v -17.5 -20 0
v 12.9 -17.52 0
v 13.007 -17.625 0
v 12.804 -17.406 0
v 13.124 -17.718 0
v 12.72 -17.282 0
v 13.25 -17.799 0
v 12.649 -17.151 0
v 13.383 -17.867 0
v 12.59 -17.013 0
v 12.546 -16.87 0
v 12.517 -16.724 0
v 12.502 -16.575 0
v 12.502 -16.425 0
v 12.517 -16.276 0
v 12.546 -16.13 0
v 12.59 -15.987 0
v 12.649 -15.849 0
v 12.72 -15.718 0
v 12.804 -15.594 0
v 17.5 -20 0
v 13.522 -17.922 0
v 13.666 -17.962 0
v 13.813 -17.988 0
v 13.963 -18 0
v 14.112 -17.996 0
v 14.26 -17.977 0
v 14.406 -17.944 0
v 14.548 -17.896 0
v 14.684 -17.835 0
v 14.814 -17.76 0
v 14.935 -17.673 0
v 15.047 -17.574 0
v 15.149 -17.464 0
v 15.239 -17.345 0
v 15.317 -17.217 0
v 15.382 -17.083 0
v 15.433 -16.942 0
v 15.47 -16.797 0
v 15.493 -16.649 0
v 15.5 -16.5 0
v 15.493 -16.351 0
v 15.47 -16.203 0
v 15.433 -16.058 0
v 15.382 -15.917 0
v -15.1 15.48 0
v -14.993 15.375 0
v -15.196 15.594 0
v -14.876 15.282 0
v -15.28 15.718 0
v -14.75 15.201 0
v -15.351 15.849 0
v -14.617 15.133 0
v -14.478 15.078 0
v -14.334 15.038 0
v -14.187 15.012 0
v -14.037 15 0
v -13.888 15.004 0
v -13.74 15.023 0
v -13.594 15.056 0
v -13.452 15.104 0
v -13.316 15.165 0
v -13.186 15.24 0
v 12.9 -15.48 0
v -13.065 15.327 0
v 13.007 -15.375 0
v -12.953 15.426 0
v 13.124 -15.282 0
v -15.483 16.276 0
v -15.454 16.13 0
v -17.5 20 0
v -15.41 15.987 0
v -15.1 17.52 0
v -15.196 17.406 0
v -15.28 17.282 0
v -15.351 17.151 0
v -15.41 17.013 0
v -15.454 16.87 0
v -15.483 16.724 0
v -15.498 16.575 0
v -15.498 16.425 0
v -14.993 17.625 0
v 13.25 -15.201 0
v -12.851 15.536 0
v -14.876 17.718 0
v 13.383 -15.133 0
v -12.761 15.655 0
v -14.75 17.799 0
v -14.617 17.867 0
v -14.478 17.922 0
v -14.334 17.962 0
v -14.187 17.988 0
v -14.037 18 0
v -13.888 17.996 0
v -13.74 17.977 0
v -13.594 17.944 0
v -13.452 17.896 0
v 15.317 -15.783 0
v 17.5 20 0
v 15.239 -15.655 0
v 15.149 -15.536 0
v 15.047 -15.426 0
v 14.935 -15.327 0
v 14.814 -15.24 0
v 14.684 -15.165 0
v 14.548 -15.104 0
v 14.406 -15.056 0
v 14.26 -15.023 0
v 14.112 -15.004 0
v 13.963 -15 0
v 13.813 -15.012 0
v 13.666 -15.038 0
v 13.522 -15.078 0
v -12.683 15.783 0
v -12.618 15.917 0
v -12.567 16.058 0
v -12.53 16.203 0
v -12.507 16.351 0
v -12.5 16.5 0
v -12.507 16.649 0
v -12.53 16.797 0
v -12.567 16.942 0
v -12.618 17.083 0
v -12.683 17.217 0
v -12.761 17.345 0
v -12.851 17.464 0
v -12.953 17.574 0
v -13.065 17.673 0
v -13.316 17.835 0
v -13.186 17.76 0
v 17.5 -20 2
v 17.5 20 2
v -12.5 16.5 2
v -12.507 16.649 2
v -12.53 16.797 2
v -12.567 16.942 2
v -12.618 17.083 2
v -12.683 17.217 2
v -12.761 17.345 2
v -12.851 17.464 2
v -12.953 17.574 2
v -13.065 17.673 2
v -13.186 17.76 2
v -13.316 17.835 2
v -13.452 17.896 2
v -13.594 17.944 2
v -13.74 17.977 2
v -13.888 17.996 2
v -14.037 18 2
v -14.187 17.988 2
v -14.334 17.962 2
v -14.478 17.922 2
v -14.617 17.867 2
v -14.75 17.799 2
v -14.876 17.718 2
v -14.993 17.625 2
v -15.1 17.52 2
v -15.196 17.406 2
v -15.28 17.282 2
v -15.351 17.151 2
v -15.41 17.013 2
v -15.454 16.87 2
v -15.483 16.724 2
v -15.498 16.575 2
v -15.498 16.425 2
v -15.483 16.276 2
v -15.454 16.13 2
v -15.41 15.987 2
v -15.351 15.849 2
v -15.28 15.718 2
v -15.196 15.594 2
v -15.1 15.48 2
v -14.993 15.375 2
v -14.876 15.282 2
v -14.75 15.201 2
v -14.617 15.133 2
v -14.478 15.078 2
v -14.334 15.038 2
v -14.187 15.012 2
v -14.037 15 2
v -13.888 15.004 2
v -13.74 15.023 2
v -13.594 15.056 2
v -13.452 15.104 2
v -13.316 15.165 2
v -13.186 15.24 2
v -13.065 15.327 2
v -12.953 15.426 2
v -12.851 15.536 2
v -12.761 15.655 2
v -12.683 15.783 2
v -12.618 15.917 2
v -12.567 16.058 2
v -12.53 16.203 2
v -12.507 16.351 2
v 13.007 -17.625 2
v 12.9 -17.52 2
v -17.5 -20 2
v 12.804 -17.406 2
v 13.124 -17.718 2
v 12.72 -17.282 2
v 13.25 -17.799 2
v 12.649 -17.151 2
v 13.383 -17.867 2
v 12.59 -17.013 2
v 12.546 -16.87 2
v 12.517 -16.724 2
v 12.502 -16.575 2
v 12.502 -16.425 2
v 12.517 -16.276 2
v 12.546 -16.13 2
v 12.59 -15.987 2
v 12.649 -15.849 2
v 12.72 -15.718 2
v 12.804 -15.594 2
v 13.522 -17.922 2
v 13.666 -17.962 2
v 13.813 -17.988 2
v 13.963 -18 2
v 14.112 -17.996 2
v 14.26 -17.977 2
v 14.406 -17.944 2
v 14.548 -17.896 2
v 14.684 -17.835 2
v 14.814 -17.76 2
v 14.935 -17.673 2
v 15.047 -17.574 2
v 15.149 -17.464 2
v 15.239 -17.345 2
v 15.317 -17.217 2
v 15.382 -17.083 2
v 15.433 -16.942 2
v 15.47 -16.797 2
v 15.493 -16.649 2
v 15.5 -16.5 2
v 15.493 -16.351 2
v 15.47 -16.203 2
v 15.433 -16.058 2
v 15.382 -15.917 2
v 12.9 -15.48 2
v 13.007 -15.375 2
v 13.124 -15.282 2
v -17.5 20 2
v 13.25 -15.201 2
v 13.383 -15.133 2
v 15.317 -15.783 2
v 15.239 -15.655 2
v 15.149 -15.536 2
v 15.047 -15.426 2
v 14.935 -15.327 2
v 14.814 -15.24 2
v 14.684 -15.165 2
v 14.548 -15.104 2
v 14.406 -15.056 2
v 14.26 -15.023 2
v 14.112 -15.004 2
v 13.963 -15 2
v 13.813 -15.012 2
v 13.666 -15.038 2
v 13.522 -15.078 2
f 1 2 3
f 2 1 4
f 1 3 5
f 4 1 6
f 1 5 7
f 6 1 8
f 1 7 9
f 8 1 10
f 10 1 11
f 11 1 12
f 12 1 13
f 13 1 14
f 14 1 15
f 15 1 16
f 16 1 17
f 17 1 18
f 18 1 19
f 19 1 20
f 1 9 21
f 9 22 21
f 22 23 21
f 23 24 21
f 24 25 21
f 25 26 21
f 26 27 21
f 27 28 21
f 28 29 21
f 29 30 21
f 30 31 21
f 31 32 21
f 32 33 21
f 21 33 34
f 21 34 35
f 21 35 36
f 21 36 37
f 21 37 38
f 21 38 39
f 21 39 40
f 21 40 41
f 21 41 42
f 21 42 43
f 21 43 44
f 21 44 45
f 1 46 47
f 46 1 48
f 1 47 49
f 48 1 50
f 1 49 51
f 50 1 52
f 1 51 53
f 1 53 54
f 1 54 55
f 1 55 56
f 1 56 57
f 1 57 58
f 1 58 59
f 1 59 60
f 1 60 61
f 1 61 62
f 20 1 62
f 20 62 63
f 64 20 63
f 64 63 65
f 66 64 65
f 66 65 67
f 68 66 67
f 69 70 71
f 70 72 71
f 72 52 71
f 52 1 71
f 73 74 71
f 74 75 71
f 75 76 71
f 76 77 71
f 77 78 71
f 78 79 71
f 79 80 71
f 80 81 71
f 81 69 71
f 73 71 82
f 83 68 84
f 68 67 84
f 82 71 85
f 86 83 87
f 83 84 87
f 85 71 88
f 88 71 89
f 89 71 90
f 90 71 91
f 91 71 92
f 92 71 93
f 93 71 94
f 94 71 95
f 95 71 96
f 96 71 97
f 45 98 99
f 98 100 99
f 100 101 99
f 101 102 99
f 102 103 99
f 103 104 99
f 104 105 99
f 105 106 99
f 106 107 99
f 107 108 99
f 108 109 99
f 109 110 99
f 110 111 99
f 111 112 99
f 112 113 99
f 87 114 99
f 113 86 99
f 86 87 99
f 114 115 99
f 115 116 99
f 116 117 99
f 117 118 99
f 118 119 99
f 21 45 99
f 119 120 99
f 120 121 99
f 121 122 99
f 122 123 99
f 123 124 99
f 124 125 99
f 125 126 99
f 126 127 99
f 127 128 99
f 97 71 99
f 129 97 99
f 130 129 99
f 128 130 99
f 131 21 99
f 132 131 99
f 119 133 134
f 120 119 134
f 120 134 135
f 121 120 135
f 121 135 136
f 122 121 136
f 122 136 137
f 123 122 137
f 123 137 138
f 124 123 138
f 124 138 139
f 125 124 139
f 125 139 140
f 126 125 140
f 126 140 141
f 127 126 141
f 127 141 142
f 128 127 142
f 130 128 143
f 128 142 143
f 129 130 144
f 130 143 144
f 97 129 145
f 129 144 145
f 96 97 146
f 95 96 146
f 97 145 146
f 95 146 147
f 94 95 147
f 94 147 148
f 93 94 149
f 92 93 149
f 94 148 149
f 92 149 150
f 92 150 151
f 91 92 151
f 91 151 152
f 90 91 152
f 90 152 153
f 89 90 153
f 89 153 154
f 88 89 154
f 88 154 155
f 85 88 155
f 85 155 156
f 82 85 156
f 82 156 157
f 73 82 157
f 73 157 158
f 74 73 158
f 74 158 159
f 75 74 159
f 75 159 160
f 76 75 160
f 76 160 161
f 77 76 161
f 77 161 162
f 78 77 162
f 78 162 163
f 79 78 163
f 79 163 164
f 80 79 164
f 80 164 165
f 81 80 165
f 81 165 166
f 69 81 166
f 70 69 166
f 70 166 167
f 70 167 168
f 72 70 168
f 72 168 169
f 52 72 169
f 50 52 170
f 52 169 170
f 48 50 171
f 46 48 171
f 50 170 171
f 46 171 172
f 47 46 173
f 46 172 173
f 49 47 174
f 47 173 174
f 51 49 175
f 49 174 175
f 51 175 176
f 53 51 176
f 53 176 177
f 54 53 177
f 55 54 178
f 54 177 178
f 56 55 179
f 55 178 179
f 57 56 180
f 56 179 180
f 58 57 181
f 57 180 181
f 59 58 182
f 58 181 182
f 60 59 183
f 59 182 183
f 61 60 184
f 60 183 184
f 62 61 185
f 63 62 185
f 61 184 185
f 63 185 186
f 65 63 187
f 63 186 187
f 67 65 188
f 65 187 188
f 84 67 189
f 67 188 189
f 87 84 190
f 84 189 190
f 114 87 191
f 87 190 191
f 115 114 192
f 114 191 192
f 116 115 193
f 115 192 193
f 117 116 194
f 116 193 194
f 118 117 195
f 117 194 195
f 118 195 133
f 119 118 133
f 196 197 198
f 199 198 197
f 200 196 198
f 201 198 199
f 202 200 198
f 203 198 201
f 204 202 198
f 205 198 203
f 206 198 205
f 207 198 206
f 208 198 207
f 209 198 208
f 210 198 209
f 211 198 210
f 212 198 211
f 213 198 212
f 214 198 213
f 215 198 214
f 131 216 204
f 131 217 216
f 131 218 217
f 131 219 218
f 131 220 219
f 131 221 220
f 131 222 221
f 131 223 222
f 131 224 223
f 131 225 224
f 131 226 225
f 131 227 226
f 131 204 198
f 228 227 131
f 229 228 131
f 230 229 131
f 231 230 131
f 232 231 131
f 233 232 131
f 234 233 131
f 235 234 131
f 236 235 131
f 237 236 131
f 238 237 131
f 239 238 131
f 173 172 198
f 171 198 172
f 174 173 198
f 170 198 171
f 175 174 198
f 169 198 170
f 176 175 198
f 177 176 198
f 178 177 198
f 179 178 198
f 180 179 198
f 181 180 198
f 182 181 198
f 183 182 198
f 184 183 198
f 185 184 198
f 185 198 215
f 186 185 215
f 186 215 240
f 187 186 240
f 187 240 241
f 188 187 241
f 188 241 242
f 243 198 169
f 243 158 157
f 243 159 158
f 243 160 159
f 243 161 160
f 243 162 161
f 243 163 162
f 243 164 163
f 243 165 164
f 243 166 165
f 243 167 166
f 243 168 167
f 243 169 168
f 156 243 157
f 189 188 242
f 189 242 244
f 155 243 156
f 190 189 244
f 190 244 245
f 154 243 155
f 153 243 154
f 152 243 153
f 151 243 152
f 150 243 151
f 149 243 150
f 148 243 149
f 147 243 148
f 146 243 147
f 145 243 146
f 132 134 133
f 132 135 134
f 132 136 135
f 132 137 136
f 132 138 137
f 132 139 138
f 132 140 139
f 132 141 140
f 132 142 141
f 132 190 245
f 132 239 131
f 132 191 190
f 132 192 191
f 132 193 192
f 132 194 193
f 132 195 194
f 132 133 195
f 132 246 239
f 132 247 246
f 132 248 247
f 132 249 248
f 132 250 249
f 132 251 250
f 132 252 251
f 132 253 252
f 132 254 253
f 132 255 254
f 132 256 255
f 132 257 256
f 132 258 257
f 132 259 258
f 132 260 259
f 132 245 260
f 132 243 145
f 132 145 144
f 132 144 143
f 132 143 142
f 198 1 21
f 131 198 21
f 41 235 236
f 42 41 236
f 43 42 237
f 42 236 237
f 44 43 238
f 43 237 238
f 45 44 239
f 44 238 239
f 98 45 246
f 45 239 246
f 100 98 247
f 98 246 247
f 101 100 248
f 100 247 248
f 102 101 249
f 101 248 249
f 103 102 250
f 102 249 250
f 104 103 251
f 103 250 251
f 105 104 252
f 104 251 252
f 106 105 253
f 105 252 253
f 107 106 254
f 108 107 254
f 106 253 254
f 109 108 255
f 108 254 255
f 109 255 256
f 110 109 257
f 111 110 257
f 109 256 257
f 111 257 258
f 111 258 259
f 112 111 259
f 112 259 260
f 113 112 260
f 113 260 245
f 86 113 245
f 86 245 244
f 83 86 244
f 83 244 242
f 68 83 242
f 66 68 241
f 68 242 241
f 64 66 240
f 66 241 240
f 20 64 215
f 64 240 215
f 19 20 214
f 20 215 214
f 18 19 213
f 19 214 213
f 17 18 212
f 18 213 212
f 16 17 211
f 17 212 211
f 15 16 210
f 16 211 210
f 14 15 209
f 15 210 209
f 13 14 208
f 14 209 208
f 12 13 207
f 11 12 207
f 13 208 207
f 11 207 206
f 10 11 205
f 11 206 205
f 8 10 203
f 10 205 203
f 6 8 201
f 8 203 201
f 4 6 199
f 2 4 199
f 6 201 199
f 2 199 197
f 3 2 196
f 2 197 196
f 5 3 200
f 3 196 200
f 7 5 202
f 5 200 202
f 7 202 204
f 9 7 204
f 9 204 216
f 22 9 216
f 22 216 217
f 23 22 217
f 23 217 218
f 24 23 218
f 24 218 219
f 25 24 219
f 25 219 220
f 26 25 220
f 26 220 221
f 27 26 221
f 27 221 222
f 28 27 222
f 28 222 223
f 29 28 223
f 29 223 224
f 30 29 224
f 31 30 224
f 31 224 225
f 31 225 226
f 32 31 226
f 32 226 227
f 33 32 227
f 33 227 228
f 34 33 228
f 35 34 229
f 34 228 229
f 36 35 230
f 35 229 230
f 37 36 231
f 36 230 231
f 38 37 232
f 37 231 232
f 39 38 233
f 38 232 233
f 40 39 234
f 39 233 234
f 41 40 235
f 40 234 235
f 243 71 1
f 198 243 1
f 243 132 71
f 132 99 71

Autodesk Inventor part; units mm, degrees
ref_plane "YZ Plane" through (0, 0, 0) normal (1, 0, 0) x (0, 1, 0)
ref_plane "XZ Plane" through (0, 0, 0) normal (0, 1, 0) x (-1, 0, 0)
ref_plane "XY Plane" through (0, 0, 0) normal (0, 0, 1) x (1, 0, 0)
sketch "Sketch1" plane through (0, 0, 0) normal (0, 0, 1) x (1, 0, 0)
  line L0 (0, 0) -> (17.5, 0)
  line L1 (17.5, 0) -> (17.5, 20)
  line L2 (17.5, 20) -> (0, 20)
  line L3 (0, 20) -> (0, 0)
  line L4 (0, 0) -> (-17.5, 0)
  line L5 (-17.5, 0) -> (-17.5, -20)
  line L6 (-17.5, -20) -> (0, -20)
  line L7 (0, -20) -> (0, 0)
  line L8 (-17.5, -20) -> (17.5, -20)
  line L9 (17.5, -20) -> (17.5, 20)
  line L10 (17.5, 20) -> (-17.5, 20)
  line L11 (-17.5, 20) -> (-17.5, -20)
  point P0 (0, 20)
  point P1 (0, -20)
  dimension "d7" = 40
  dimension "d8" = 35
extrude "Extrusion1" add sketch "Sketch1" along normal blind 2
sketch "Sketch2" plane through (0, 0, 2) normal (0, 0, 1) x (1, 0, 0)
  line L0 (17.5, -20) -> (-17.5, -20) construction
  line L1 (17.5, 20) -> (17.5, -20) construction
  line L2 (-17.5, 20) -> (17.5, 20) construction
  line L3 (-17.5, -20) -> (-17.5, 20) construction
  line L4 (14, 16.5) -> (14, -16.5) construction
  line L5 (14, -16.5) -> (-14, -16.5) construction
  line L6 (-14, -16.5) -> (-14, 16.5) construction
  line L7 (-14, 16.5) -> (14, 16.5) construction
  circle A0 centre (-14, 16.5) radius 1.5
  circle A1 centre (14, -16.5) radius 1.5
  point P0 (0, 0)
  dimension "d9" = 3
  dimension "d10" = 3.5
extrude "Extrusion2" cut sketch "Sketch2" against normal through all
properties part number "Bottom"
